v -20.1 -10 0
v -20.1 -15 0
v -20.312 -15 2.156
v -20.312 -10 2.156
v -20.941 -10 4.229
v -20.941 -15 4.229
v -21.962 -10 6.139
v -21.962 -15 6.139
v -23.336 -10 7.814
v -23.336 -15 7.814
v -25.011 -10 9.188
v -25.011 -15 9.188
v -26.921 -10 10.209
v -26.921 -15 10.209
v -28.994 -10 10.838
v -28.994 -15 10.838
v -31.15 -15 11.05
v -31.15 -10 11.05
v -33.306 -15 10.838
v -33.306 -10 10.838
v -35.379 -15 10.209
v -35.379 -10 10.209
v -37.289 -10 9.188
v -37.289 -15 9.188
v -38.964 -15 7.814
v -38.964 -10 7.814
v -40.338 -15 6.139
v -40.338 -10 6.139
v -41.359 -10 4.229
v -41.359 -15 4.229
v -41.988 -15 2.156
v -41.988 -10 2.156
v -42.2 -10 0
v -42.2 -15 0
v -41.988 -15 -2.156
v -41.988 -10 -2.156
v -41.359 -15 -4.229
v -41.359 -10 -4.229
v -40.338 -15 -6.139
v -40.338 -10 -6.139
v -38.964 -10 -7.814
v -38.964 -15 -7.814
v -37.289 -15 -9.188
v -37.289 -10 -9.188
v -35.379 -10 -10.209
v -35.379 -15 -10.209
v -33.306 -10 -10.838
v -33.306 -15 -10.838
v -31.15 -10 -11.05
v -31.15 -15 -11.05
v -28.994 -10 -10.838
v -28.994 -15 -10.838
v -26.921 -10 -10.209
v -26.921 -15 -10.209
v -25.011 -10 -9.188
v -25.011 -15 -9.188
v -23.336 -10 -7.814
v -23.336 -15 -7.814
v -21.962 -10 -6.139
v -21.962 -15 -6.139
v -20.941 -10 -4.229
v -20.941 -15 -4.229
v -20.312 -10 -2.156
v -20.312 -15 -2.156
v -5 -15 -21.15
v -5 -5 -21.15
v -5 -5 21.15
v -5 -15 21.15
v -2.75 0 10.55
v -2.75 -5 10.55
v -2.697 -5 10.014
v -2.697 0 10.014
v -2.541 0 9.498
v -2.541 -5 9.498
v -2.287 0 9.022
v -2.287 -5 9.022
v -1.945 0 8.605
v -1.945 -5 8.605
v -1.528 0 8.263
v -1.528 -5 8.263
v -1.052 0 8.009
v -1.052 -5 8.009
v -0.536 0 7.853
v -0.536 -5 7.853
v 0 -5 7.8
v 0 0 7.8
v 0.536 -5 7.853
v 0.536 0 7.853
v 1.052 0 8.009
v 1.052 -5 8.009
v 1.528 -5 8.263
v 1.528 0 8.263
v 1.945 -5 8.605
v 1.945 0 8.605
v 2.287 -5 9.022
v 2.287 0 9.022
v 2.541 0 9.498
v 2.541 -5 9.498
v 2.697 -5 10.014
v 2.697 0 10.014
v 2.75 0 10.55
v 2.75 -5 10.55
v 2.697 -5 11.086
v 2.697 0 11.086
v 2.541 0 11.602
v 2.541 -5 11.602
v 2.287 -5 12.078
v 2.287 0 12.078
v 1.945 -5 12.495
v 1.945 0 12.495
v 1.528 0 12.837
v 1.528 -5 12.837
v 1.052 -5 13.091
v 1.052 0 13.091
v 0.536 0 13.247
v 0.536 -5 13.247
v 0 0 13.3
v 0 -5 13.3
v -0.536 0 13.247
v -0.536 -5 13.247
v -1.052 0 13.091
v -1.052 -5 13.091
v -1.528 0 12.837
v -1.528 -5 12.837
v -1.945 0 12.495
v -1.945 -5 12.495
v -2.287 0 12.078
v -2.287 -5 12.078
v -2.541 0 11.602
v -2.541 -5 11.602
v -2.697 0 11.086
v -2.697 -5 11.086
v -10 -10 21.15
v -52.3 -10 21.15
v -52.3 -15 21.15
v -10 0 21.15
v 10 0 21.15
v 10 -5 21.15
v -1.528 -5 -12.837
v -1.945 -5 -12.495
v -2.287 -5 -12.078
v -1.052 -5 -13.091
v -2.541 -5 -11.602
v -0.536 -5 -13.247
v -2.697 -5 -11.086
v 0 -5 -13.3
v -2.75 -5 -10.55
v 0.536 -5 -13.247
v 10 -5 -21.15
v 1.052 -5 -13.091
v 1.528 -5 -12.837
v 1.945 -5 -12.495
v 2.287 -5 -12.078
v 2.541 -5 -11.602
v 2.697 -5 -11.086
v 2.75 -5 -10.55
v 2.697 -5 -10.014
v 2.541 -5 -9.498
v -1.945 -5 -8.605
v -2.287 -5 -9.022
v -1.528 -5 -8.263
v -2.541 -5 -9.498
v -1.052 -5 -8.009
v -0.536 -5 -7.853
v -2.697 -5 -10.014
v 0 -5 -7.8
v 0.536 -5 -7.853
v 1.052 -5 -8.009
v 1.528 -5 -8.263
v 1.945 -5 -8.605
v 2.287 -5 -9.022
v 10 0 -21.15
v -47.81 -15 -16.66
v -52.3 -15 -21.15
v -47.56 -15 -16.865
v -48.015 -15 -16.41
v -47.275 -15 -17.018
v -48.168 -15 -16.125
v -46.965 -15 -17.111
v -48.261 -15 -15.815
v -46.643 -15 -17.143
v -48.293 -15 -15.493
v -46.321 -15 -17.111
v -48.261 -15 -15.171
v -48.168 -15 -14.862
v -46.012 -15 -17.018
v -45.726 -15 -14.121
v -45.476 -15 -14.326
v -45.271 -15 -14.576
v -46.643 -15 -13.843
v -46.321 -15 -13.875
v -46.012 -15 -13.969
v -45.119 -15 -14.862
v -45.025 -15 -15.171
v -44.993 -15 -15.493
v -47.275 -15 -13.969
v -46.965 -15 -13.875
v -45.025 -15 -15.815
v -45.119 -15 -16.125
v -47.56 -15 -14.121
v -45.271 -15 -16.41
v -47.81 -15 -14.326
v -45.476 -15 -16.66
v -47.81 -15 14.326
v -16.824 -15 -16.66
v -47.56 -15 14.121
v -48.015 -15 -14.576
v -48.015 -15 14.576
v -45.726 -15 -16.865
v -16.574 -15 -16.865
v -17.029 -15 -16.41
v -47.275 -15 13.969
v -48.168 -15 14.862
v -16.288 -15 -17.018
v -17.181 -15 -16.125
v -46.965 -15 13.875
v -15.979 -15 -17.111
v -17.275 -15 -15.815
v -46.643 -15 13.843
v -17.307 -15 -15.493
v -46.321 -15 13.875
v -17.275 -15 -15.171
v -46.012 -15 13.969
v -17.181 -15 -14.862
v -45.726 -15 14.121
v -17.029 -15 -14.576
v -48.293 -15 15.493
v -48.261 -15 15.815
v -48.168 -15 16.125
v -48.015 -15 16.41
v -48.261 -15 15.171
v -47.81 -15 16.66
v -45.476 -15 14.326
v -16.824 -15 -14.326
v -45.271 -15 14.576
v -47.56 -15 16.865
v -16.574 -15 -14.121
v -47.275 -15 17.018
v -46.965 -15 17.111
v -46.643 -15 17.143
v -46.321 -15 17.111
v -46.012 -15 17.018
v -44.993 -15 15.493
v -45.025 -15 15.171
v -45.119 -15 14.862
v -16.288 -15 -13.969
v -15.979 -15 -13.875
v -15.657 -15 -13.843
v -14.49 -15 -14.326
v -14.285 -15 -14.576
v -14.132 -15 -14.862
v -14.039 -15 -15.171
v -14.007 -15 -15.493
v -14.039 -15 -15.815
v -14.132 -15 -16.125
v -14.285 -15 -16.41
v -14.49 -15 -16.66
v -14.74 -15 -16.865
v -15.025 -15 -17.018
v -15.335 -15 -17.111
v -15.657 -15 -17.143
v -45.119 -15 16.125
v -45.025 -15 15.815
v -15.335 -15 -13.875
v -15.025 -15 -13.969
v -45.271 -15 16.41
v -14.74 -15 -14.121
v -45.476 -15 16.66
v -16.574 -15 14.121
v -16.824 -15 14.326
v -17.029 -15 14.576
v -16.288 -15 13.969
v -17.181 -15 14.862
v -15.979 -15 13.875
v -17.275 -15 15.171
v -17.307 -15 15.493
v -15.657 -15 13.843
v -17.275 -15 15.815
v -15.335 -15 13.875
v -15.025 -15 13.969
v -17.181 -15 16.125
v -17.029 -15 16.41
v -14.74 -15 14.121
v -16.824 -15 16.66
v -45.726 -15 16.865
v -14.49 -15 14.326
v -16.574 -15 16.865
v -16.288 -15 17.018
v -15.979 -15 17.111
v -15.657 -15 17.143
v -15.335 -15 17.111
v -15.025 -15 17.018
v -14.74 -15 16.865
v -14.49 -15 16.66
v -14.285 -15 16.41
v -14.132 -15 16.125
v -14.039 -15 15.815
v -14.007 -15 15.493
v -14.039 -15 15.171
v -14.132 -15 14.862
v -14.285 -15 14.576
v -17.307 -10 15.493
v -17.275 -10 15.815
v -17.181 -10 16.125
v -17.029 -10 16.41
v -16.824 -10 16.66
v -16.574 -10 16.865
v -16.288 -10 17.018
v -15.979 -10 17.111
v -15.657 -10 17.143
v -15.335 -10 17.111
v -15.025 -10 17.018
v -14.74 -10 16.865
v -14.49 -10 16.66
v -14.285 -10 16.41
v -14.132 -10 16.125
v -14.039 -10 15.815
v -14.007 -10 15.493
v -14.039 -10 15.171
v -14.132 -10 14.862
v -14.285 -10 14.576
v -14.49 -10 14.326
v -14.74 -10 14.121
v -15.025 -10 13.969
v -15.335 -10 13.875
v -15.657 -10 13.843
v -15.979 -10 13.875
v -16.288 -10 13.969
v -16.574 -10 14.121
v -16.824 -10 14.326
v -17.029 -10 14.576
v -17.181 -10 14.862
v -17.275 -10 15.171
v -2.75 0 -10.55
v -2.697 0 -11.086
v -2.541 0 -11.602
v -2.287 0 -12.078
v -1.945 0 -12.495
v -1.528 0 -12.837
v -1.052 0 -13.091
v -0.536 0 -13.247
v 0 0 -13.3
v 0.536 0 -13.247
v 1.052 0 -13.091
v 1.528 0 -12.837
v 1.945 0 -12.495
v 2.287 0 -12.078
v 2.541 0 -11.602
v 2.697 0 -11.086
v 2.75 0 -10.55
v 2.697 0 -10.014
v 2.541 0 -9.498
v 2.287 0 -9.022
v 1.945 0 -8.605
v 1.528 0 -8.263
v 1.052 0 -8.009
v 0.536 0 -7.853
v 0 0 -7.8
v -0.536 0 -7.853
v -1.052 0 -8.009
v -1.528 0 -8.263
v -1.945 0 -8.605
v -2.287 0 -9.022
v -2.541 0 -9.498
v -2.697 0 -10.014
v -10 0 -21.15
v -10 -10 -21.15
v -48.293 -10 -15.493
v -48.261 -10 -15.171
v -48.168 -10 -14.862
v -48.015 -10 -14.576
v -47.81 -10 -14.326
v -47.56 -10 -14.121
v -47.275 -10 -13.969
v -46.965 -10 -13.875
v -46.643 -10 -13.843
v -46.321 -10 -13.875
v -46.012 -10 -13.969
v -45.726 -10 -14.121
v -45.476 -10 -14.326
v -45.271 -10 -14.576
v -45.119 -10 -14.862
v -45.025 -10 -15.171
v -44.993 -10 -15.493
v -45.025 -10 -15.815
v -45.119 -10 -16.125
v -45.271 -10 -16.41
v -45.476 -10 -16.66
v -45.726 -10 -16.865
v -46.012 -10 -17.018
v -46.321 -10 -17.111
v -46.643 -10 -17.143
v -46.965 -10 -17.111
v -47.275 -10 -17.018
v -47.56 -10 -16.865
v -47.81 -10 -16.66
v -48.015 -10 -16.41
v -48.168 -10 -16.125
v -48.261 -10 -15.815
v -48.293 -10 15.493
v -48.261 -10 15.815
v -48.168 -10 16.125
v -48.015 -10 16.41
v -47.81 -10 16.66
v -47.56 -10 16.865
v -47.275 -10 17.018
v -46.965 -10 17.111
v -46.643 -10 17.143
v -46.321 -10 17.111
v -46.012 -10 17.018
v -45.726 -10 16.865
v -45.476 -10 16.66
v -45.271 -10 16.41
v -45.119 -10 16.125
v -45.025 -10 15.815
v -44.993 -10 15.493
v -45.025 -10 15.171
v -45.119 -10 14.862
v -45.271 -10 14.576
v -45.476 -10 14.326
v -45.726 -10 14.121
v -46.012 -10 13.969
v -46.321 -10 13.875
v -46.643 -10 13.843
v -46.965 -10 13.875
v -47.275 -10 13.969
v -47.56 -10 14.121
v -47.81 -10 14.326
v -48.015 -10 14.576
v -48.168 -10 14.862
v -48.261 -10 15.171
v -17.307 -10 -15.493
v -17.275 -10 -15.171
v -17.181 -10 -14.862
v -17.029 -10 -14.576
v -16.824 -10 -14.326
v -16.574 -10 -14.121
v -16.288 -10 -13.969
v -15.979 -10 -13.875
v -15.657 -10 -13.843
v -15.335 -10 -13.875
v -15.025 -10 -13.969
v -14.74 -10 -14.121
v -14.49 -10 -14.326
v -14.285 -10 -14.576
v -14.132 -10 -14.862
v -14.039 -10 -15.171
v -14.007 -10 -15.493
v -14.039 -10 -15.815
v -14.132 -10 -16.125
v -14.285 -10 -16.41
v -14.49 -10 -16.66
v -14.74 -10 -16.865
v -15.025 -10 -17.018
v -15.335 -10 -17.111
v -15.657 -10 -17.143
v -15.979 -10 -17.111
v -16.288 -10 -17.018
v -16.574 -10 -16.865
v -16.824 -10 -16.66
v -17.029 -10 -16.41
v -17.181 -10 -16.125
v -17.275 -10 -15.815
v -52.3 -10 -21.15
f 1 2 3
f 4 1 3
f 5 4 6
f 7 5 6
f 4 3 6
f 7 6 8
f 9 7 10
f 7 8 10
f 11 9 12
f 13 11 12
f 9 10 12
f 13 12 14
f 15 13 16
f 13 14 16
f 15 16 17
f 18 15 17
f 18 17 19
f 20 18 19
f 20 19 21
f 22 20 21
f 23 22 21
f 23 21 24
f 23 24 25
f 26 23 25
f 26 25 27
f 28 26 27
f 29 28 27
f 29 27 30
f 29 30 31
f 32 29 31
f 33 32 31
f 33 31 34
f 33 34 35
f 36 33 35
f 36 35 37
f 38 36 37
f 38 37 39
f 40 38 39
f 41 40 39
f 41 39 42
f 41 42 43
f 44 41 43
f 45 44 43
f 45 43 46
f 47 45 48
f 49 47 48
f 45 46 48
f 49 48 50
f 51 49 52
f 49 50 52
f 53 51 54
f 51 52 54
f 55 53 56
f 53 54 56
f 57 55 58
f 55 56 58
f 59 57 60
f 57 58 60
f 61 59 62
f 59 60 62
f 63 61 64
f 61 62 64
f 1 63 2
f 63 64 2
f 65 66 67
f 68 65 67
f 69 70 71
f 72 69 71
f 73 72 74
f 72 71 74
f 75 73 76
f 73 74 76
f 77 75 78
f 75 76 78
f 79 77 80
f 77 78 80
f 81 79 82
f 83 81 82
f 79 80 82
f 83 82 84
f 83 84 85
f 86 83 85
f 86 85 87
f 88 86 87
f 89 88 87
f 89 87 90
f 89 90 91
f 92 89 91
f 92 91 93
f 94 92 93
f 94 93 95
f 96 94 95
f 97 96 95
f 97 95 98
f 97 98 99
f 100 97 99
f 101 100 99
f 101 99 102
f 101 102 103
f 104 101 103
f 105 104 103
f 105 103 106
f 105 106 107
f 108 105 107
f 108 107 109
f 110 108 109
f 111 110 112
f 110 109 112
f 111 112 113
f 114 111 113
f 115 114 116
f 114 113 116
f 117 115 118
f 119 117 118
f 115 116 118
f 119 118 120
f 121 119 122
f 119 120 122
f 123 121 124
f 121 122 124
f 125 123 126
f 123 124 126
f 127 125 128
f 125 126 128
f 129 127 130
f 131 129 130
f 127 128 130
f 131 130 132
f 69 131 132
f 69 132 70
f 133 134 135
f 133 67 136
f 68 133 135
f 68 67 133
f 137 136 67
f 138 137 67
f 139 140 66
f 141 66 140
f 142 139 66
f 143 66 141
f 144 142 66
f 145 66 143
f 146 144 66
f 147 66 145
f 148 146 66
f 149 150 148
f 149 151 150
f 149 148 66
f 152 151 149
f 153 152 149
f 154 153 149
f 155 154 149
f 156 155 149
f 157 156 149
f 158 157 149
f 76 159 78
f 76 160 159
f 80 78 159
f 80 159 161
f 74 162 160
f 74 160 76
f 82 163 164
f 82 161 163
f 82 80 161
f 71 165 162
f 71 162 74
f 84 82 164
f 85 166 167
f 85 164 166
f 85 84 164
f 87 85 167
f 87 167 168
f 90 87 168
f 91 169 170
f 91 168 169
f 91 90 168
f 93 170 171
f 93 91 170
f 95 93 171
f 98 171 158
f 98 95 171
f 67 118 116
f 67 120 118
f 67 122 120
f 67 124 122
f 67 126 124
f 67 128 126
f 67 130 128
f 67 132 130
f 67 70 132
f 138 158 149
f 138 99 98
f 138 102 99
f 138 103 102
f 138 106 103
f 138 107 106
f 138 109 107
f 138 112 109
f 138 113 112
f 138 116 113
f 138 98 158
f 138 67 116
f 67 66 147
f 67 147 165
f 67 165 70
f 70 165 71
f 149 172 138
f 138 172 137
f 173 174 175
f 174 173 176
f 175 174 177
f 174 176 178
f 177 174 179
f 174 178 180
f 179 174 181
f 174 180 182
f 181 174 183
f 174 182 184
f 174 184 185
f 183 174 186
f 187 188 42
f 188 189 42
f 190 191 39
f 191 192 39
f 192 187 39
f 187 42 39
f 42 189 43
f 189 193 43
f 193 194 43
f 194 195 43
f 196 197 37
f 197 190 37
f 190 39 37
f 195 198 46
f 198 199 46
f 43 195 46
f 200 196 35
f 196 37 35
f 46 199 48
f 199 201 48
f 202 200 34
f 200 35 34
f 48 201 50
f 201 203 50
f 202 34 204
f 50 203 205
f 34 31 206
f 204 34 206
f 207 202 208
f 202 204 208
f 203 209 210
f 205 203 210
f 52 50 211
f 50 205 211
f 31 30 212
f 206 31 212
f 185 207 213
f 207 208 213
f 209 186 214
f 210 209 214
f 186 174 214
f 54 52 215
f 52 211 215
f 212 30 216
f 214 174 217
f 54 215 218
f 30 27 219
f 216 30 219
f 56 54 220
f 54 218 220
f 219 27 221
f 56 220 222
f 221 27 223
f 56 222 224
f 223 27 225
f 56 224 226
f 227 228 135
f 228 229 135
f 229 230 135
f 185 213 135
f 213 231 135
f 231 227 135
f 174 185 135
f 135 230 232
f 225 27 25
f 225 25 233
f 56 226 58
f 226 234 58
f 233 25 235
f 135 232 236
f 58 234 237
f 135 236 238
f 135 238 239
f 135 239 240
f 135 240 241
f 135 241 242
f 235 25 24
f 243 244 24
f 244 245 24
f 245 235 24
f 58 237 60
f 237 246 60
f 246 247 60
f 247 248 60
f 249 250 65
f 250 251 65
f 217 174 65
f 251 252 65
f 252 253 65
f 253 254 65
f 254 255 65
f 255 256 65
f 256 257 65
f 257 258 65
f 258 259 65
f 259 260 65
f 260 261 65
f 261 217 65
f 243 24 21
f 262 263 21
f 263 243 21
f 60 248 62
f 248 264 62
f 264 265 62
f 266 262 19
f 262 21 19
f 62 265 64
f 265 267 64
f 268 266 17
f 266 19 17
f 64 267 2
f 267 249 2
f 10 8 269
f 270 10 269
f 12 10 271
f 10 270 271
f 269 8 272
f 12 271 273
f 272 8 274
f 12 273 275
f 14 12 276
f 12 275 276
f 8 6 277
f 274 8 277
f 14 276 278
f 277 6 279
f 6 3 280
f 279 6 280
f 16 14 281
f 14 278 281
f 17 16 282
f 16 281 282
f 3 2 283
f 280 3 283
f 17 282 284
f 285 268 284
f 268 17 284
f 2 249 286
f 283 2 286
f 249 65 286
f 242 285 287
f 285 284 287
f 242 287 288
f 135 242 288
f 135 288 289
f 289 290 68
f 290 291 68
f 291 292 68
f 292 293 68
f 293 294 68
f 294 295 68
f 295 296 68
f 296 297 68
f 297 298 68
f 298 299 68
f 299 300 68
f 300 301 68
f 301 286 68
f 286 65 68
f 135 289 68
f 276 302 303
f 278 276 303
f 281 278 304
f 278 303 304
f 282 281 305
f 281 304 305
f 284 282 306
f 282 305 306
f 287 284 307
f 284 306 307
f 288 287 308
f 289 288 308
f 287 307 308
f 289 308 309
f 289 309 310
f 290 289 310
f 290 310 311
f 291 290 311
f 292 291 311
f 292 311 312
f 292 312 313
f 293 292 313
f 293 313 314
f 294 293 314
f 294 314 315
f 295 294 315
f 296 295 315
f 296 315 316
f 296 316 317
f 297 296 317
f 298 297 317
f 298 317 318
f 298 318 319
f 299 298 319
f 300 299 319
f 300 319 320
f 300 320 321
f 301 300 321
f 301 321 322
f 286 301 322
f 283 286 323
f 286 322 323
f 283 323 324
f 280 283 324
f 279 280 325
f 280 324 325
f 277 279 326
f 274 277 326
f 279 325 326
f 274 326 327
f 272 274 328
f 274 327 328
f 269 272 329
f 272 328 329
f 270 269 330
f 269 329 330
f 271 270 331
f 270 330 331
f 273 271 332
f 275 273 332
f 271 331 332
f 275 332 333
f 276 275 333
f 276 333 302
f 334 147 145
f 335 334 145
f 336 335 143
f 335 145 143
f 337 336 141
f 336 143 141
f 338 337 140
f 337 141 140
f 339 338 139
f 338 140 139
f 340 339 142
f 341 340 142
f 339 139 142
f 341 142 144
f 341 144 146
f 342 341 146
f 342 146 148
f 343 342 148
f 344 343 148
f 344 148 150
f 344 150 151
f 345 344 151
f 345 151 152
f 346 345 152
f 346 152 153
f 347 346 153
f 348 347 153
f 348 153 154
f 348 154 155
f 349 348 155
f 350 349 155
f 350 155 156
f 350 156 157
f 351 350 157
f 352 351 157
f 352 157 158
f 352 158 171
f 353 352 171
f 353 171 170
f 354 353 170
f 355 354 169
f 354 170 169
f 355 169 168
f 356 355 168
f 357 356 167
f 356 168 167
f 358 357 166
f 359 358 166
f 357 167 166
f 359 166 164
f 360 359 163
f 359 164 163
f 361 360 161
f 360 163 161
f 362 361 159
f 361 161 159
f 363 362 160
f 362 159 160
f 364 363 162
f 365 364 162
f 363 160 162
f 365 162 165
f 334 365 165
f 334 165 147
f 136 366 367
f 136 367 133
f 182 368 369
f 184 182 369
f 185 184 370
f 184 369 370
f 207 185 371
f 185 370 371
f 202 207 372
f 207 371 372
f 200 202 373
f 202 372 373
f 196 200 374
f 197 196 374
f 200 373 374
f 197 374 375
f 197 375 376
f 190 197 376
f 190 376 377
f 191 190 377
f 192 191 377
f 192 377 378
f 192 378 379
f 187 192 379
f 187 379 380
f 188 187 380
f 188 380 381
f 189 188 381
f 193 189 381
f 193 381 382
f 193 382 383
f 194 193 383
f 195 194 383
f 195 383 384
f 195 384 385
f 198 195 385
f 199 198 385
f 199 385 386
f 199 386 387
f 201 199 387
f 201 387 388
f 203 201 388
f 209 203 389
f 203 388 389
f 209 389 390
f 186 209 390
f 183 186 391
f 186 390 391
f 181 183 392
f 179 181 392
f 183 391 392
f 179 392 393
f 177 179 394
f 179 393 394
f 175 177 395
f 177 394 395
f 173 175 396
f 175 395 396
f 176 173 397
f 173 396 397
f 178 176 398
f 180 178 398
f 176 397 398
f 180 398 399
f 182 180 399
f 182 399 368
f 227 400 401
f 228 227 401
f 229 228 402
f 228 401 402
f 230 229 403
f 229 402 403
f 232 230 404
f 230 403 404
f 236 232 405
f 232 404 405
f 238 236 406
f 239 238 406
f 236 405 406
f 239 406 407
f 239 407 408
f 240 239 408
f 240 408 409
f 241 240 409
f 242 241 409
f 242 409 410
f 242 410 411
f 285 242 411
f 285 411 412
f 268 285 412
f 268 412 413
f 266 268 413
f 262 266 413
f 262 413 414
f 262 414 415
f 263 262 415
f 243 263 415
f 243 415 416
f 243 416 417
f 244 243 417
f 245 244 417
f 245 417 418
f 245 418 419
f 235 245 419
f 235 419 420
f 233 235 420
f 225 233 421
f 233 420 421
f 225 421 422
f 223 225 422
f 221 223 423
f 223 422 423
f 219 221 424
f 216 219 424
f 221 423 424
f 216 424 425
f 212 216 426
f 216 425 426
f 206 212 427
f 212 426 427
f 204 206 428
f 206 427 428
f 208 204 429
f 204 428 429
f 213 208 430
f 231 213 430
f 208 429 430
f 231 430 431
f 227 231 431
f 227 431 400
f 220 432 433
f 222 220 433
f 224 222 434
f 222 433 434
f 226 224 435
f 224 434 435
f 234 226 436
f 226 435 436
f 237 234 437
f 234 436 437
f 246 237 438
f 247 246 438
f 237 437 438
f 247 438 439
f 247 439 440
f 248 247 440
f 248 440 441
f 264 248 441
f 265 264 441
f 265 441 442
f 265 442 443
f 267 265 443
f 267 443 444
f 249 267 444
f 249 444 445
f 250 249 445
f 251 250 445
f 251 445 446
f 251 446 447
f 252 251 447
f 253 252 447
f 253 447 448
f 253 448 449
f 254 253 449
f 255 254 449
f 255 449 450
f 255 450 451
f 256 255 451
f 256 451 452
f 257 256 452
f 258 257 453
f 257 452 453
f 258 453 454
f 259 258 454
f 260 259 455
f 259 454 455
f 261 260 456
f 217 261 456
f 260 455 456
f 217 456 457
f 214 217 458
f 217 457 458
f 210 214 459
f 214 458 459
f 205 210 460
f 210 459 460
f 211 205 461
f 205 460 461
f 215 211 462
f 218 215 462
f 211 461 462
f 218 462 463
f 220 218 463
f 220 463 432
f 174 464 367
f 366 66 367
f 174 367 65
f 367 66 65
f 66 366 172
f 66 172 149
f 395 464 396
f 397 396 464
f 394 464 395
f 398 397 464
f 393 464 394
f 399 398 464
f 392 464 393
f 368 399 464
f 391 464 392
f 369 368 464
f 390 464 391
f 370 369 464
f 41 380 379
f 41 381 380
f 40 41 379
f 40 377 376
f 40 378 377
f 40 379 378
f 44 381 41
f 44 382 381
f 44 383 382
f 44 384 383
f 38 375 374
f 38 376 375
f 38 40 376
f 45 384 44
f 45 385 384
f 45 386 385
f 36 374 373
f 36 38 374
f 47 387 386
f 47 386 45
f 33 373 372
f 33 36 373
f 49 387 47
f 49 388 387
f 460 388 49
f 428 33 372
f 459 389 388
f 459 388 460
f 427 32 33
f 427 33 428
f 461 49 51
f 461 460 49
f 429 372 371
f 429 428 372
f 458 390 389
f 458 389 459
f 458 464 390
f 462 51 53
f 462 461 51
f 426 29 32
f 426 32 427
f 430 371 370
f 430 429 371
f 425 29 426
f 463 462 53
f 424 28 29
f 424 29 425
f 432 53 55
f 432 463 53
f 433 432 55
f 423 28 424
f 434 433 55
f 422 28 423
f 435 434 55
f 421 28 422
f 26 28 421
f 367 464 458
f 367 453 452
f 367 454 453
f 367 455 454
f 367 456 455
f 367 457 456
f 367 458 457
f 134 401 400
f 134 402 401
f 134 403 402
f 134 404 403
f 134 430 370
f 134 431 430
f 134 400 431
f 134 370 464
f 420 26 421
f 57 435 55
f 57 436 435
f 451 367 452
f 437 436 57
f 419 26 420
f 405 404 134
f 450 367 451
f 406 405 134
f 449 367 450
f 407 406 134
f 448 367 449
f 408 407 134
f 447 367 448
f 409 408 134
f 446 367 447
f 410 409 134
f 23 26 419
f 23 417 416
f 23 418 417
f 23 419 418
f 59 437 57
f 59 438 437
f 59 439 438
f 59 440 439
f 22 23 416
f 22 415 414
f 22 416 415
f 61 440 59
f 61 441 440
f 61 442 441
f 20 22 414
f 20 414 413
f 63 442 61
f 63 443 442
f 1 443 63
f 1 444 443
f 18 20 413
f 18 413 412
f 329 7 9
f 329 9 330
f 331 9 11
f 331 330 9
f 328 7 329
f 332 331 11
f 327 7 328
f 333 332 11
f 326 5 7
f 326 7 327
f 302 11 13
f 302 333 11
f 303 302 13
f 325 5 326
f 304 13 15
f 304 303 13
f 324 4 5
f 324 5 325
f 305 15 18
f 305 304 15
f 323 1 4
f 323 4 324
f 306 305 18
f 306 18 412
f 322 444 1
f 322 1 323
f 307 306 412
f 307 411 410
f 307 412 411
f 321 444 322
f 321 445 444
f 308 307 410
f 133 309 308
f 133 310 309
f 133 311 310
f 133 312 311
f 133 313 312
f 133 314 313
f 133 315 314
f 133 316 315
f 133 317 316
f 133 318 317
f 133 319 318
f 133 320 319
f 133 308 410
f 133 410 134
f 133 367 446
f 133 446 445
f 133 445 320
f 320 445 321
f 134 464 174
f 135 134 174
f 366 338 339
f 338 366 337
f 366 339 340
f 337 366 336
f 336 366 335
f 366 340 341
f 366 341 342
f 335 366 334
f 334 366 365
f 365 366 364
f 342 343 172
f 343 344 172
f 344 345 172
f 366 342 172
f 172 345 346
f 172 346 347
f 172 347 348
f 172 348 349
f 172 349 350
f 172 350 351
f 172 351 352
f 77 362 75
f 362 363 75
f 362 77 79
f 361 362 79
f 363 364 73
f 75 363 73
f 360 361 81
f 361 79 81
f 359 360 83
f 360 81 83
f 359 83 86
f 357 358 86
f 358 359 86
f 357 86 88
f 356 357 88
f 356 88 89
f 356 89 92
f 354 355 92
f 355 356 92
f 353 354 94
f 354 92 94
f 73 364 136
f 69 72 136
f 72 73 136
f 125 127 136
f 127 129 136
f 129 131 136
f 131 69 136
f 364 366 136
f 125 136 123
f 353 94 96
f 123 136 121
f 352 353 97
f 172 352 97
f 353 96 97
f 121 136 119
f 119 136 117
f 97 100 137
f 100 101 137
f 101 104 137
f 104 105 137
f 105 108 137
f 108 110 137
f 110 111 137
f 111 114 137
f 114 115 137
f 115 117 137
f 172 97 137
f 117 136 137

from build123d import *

# Parameters (mm, degrees)
F0_W     = 20
F0_H     = 42.3
F1_DEPTH = 5
F2_W     = 5
F2_H     = 42.3
F3_DEPTH = 10
F4_W     = 5
F4_H     = 42.3
F5_DEPTH = 42.3
F6_R     = 11.05
F7_DEPTH = 5.1
F8_D     = 3.3
F9_D     = 5.5


with BuildPart() as f1:
    # F0 (on Front) → F1 (new body)
    with BuildSketch(Plane.XZ):
        Rectangle(F0_W, F0_H)
    extrude(amount=F1_DEPTH)

    # F2 (on face) → F3 (join)
    with BuildSketch(Plane.XZ.offset(5)):
        with Locations((-7.5, 0)):
            Rectangle(F2_W, F2_H)
    extrude(amount=F3_DEPTH)

    # F4 (on face) → F5 (join)
    with BuildSketch(Plane(origin=(-10, 0, 0), x_dir=(0, -1, 0), z_dir=(-1, 0, 0))):
        with Locations((12.5, 0)):
            Rectangle(F4_W, F4_H)
    extrude(amount=F5_DEPTH)

    # F6 (on face) → F7 (cut)
    with BuildSketch(Plane.XZ.offset(15)):
        with Locations((-31.15, 0)):
            Circle(F6_R)
    extrude(amount=-F7_DEPTH, mode=Mode.SUBTRACT)

    # F8 (through all)
    with Locations(Plane.XZ.offset(15)):
        with Locations((-46.6431457505, 15.4931457505), (-15.6568542495, 15.4931457505), (-15.6568542495, -15.4931457505), (-46.6431457505, -15.4931457505)):
            Hole(F8_D / 2)

    # F9 (through all)
    with Locations(Plane(origin=(0, 0, 0), x_dir=(1, 0, 0), z_dir=(0, 1, 0))):
        with Locations((0, -10.55), (0, 10.55)):
            Hole(F9_D / 2)


solid = f1.part
